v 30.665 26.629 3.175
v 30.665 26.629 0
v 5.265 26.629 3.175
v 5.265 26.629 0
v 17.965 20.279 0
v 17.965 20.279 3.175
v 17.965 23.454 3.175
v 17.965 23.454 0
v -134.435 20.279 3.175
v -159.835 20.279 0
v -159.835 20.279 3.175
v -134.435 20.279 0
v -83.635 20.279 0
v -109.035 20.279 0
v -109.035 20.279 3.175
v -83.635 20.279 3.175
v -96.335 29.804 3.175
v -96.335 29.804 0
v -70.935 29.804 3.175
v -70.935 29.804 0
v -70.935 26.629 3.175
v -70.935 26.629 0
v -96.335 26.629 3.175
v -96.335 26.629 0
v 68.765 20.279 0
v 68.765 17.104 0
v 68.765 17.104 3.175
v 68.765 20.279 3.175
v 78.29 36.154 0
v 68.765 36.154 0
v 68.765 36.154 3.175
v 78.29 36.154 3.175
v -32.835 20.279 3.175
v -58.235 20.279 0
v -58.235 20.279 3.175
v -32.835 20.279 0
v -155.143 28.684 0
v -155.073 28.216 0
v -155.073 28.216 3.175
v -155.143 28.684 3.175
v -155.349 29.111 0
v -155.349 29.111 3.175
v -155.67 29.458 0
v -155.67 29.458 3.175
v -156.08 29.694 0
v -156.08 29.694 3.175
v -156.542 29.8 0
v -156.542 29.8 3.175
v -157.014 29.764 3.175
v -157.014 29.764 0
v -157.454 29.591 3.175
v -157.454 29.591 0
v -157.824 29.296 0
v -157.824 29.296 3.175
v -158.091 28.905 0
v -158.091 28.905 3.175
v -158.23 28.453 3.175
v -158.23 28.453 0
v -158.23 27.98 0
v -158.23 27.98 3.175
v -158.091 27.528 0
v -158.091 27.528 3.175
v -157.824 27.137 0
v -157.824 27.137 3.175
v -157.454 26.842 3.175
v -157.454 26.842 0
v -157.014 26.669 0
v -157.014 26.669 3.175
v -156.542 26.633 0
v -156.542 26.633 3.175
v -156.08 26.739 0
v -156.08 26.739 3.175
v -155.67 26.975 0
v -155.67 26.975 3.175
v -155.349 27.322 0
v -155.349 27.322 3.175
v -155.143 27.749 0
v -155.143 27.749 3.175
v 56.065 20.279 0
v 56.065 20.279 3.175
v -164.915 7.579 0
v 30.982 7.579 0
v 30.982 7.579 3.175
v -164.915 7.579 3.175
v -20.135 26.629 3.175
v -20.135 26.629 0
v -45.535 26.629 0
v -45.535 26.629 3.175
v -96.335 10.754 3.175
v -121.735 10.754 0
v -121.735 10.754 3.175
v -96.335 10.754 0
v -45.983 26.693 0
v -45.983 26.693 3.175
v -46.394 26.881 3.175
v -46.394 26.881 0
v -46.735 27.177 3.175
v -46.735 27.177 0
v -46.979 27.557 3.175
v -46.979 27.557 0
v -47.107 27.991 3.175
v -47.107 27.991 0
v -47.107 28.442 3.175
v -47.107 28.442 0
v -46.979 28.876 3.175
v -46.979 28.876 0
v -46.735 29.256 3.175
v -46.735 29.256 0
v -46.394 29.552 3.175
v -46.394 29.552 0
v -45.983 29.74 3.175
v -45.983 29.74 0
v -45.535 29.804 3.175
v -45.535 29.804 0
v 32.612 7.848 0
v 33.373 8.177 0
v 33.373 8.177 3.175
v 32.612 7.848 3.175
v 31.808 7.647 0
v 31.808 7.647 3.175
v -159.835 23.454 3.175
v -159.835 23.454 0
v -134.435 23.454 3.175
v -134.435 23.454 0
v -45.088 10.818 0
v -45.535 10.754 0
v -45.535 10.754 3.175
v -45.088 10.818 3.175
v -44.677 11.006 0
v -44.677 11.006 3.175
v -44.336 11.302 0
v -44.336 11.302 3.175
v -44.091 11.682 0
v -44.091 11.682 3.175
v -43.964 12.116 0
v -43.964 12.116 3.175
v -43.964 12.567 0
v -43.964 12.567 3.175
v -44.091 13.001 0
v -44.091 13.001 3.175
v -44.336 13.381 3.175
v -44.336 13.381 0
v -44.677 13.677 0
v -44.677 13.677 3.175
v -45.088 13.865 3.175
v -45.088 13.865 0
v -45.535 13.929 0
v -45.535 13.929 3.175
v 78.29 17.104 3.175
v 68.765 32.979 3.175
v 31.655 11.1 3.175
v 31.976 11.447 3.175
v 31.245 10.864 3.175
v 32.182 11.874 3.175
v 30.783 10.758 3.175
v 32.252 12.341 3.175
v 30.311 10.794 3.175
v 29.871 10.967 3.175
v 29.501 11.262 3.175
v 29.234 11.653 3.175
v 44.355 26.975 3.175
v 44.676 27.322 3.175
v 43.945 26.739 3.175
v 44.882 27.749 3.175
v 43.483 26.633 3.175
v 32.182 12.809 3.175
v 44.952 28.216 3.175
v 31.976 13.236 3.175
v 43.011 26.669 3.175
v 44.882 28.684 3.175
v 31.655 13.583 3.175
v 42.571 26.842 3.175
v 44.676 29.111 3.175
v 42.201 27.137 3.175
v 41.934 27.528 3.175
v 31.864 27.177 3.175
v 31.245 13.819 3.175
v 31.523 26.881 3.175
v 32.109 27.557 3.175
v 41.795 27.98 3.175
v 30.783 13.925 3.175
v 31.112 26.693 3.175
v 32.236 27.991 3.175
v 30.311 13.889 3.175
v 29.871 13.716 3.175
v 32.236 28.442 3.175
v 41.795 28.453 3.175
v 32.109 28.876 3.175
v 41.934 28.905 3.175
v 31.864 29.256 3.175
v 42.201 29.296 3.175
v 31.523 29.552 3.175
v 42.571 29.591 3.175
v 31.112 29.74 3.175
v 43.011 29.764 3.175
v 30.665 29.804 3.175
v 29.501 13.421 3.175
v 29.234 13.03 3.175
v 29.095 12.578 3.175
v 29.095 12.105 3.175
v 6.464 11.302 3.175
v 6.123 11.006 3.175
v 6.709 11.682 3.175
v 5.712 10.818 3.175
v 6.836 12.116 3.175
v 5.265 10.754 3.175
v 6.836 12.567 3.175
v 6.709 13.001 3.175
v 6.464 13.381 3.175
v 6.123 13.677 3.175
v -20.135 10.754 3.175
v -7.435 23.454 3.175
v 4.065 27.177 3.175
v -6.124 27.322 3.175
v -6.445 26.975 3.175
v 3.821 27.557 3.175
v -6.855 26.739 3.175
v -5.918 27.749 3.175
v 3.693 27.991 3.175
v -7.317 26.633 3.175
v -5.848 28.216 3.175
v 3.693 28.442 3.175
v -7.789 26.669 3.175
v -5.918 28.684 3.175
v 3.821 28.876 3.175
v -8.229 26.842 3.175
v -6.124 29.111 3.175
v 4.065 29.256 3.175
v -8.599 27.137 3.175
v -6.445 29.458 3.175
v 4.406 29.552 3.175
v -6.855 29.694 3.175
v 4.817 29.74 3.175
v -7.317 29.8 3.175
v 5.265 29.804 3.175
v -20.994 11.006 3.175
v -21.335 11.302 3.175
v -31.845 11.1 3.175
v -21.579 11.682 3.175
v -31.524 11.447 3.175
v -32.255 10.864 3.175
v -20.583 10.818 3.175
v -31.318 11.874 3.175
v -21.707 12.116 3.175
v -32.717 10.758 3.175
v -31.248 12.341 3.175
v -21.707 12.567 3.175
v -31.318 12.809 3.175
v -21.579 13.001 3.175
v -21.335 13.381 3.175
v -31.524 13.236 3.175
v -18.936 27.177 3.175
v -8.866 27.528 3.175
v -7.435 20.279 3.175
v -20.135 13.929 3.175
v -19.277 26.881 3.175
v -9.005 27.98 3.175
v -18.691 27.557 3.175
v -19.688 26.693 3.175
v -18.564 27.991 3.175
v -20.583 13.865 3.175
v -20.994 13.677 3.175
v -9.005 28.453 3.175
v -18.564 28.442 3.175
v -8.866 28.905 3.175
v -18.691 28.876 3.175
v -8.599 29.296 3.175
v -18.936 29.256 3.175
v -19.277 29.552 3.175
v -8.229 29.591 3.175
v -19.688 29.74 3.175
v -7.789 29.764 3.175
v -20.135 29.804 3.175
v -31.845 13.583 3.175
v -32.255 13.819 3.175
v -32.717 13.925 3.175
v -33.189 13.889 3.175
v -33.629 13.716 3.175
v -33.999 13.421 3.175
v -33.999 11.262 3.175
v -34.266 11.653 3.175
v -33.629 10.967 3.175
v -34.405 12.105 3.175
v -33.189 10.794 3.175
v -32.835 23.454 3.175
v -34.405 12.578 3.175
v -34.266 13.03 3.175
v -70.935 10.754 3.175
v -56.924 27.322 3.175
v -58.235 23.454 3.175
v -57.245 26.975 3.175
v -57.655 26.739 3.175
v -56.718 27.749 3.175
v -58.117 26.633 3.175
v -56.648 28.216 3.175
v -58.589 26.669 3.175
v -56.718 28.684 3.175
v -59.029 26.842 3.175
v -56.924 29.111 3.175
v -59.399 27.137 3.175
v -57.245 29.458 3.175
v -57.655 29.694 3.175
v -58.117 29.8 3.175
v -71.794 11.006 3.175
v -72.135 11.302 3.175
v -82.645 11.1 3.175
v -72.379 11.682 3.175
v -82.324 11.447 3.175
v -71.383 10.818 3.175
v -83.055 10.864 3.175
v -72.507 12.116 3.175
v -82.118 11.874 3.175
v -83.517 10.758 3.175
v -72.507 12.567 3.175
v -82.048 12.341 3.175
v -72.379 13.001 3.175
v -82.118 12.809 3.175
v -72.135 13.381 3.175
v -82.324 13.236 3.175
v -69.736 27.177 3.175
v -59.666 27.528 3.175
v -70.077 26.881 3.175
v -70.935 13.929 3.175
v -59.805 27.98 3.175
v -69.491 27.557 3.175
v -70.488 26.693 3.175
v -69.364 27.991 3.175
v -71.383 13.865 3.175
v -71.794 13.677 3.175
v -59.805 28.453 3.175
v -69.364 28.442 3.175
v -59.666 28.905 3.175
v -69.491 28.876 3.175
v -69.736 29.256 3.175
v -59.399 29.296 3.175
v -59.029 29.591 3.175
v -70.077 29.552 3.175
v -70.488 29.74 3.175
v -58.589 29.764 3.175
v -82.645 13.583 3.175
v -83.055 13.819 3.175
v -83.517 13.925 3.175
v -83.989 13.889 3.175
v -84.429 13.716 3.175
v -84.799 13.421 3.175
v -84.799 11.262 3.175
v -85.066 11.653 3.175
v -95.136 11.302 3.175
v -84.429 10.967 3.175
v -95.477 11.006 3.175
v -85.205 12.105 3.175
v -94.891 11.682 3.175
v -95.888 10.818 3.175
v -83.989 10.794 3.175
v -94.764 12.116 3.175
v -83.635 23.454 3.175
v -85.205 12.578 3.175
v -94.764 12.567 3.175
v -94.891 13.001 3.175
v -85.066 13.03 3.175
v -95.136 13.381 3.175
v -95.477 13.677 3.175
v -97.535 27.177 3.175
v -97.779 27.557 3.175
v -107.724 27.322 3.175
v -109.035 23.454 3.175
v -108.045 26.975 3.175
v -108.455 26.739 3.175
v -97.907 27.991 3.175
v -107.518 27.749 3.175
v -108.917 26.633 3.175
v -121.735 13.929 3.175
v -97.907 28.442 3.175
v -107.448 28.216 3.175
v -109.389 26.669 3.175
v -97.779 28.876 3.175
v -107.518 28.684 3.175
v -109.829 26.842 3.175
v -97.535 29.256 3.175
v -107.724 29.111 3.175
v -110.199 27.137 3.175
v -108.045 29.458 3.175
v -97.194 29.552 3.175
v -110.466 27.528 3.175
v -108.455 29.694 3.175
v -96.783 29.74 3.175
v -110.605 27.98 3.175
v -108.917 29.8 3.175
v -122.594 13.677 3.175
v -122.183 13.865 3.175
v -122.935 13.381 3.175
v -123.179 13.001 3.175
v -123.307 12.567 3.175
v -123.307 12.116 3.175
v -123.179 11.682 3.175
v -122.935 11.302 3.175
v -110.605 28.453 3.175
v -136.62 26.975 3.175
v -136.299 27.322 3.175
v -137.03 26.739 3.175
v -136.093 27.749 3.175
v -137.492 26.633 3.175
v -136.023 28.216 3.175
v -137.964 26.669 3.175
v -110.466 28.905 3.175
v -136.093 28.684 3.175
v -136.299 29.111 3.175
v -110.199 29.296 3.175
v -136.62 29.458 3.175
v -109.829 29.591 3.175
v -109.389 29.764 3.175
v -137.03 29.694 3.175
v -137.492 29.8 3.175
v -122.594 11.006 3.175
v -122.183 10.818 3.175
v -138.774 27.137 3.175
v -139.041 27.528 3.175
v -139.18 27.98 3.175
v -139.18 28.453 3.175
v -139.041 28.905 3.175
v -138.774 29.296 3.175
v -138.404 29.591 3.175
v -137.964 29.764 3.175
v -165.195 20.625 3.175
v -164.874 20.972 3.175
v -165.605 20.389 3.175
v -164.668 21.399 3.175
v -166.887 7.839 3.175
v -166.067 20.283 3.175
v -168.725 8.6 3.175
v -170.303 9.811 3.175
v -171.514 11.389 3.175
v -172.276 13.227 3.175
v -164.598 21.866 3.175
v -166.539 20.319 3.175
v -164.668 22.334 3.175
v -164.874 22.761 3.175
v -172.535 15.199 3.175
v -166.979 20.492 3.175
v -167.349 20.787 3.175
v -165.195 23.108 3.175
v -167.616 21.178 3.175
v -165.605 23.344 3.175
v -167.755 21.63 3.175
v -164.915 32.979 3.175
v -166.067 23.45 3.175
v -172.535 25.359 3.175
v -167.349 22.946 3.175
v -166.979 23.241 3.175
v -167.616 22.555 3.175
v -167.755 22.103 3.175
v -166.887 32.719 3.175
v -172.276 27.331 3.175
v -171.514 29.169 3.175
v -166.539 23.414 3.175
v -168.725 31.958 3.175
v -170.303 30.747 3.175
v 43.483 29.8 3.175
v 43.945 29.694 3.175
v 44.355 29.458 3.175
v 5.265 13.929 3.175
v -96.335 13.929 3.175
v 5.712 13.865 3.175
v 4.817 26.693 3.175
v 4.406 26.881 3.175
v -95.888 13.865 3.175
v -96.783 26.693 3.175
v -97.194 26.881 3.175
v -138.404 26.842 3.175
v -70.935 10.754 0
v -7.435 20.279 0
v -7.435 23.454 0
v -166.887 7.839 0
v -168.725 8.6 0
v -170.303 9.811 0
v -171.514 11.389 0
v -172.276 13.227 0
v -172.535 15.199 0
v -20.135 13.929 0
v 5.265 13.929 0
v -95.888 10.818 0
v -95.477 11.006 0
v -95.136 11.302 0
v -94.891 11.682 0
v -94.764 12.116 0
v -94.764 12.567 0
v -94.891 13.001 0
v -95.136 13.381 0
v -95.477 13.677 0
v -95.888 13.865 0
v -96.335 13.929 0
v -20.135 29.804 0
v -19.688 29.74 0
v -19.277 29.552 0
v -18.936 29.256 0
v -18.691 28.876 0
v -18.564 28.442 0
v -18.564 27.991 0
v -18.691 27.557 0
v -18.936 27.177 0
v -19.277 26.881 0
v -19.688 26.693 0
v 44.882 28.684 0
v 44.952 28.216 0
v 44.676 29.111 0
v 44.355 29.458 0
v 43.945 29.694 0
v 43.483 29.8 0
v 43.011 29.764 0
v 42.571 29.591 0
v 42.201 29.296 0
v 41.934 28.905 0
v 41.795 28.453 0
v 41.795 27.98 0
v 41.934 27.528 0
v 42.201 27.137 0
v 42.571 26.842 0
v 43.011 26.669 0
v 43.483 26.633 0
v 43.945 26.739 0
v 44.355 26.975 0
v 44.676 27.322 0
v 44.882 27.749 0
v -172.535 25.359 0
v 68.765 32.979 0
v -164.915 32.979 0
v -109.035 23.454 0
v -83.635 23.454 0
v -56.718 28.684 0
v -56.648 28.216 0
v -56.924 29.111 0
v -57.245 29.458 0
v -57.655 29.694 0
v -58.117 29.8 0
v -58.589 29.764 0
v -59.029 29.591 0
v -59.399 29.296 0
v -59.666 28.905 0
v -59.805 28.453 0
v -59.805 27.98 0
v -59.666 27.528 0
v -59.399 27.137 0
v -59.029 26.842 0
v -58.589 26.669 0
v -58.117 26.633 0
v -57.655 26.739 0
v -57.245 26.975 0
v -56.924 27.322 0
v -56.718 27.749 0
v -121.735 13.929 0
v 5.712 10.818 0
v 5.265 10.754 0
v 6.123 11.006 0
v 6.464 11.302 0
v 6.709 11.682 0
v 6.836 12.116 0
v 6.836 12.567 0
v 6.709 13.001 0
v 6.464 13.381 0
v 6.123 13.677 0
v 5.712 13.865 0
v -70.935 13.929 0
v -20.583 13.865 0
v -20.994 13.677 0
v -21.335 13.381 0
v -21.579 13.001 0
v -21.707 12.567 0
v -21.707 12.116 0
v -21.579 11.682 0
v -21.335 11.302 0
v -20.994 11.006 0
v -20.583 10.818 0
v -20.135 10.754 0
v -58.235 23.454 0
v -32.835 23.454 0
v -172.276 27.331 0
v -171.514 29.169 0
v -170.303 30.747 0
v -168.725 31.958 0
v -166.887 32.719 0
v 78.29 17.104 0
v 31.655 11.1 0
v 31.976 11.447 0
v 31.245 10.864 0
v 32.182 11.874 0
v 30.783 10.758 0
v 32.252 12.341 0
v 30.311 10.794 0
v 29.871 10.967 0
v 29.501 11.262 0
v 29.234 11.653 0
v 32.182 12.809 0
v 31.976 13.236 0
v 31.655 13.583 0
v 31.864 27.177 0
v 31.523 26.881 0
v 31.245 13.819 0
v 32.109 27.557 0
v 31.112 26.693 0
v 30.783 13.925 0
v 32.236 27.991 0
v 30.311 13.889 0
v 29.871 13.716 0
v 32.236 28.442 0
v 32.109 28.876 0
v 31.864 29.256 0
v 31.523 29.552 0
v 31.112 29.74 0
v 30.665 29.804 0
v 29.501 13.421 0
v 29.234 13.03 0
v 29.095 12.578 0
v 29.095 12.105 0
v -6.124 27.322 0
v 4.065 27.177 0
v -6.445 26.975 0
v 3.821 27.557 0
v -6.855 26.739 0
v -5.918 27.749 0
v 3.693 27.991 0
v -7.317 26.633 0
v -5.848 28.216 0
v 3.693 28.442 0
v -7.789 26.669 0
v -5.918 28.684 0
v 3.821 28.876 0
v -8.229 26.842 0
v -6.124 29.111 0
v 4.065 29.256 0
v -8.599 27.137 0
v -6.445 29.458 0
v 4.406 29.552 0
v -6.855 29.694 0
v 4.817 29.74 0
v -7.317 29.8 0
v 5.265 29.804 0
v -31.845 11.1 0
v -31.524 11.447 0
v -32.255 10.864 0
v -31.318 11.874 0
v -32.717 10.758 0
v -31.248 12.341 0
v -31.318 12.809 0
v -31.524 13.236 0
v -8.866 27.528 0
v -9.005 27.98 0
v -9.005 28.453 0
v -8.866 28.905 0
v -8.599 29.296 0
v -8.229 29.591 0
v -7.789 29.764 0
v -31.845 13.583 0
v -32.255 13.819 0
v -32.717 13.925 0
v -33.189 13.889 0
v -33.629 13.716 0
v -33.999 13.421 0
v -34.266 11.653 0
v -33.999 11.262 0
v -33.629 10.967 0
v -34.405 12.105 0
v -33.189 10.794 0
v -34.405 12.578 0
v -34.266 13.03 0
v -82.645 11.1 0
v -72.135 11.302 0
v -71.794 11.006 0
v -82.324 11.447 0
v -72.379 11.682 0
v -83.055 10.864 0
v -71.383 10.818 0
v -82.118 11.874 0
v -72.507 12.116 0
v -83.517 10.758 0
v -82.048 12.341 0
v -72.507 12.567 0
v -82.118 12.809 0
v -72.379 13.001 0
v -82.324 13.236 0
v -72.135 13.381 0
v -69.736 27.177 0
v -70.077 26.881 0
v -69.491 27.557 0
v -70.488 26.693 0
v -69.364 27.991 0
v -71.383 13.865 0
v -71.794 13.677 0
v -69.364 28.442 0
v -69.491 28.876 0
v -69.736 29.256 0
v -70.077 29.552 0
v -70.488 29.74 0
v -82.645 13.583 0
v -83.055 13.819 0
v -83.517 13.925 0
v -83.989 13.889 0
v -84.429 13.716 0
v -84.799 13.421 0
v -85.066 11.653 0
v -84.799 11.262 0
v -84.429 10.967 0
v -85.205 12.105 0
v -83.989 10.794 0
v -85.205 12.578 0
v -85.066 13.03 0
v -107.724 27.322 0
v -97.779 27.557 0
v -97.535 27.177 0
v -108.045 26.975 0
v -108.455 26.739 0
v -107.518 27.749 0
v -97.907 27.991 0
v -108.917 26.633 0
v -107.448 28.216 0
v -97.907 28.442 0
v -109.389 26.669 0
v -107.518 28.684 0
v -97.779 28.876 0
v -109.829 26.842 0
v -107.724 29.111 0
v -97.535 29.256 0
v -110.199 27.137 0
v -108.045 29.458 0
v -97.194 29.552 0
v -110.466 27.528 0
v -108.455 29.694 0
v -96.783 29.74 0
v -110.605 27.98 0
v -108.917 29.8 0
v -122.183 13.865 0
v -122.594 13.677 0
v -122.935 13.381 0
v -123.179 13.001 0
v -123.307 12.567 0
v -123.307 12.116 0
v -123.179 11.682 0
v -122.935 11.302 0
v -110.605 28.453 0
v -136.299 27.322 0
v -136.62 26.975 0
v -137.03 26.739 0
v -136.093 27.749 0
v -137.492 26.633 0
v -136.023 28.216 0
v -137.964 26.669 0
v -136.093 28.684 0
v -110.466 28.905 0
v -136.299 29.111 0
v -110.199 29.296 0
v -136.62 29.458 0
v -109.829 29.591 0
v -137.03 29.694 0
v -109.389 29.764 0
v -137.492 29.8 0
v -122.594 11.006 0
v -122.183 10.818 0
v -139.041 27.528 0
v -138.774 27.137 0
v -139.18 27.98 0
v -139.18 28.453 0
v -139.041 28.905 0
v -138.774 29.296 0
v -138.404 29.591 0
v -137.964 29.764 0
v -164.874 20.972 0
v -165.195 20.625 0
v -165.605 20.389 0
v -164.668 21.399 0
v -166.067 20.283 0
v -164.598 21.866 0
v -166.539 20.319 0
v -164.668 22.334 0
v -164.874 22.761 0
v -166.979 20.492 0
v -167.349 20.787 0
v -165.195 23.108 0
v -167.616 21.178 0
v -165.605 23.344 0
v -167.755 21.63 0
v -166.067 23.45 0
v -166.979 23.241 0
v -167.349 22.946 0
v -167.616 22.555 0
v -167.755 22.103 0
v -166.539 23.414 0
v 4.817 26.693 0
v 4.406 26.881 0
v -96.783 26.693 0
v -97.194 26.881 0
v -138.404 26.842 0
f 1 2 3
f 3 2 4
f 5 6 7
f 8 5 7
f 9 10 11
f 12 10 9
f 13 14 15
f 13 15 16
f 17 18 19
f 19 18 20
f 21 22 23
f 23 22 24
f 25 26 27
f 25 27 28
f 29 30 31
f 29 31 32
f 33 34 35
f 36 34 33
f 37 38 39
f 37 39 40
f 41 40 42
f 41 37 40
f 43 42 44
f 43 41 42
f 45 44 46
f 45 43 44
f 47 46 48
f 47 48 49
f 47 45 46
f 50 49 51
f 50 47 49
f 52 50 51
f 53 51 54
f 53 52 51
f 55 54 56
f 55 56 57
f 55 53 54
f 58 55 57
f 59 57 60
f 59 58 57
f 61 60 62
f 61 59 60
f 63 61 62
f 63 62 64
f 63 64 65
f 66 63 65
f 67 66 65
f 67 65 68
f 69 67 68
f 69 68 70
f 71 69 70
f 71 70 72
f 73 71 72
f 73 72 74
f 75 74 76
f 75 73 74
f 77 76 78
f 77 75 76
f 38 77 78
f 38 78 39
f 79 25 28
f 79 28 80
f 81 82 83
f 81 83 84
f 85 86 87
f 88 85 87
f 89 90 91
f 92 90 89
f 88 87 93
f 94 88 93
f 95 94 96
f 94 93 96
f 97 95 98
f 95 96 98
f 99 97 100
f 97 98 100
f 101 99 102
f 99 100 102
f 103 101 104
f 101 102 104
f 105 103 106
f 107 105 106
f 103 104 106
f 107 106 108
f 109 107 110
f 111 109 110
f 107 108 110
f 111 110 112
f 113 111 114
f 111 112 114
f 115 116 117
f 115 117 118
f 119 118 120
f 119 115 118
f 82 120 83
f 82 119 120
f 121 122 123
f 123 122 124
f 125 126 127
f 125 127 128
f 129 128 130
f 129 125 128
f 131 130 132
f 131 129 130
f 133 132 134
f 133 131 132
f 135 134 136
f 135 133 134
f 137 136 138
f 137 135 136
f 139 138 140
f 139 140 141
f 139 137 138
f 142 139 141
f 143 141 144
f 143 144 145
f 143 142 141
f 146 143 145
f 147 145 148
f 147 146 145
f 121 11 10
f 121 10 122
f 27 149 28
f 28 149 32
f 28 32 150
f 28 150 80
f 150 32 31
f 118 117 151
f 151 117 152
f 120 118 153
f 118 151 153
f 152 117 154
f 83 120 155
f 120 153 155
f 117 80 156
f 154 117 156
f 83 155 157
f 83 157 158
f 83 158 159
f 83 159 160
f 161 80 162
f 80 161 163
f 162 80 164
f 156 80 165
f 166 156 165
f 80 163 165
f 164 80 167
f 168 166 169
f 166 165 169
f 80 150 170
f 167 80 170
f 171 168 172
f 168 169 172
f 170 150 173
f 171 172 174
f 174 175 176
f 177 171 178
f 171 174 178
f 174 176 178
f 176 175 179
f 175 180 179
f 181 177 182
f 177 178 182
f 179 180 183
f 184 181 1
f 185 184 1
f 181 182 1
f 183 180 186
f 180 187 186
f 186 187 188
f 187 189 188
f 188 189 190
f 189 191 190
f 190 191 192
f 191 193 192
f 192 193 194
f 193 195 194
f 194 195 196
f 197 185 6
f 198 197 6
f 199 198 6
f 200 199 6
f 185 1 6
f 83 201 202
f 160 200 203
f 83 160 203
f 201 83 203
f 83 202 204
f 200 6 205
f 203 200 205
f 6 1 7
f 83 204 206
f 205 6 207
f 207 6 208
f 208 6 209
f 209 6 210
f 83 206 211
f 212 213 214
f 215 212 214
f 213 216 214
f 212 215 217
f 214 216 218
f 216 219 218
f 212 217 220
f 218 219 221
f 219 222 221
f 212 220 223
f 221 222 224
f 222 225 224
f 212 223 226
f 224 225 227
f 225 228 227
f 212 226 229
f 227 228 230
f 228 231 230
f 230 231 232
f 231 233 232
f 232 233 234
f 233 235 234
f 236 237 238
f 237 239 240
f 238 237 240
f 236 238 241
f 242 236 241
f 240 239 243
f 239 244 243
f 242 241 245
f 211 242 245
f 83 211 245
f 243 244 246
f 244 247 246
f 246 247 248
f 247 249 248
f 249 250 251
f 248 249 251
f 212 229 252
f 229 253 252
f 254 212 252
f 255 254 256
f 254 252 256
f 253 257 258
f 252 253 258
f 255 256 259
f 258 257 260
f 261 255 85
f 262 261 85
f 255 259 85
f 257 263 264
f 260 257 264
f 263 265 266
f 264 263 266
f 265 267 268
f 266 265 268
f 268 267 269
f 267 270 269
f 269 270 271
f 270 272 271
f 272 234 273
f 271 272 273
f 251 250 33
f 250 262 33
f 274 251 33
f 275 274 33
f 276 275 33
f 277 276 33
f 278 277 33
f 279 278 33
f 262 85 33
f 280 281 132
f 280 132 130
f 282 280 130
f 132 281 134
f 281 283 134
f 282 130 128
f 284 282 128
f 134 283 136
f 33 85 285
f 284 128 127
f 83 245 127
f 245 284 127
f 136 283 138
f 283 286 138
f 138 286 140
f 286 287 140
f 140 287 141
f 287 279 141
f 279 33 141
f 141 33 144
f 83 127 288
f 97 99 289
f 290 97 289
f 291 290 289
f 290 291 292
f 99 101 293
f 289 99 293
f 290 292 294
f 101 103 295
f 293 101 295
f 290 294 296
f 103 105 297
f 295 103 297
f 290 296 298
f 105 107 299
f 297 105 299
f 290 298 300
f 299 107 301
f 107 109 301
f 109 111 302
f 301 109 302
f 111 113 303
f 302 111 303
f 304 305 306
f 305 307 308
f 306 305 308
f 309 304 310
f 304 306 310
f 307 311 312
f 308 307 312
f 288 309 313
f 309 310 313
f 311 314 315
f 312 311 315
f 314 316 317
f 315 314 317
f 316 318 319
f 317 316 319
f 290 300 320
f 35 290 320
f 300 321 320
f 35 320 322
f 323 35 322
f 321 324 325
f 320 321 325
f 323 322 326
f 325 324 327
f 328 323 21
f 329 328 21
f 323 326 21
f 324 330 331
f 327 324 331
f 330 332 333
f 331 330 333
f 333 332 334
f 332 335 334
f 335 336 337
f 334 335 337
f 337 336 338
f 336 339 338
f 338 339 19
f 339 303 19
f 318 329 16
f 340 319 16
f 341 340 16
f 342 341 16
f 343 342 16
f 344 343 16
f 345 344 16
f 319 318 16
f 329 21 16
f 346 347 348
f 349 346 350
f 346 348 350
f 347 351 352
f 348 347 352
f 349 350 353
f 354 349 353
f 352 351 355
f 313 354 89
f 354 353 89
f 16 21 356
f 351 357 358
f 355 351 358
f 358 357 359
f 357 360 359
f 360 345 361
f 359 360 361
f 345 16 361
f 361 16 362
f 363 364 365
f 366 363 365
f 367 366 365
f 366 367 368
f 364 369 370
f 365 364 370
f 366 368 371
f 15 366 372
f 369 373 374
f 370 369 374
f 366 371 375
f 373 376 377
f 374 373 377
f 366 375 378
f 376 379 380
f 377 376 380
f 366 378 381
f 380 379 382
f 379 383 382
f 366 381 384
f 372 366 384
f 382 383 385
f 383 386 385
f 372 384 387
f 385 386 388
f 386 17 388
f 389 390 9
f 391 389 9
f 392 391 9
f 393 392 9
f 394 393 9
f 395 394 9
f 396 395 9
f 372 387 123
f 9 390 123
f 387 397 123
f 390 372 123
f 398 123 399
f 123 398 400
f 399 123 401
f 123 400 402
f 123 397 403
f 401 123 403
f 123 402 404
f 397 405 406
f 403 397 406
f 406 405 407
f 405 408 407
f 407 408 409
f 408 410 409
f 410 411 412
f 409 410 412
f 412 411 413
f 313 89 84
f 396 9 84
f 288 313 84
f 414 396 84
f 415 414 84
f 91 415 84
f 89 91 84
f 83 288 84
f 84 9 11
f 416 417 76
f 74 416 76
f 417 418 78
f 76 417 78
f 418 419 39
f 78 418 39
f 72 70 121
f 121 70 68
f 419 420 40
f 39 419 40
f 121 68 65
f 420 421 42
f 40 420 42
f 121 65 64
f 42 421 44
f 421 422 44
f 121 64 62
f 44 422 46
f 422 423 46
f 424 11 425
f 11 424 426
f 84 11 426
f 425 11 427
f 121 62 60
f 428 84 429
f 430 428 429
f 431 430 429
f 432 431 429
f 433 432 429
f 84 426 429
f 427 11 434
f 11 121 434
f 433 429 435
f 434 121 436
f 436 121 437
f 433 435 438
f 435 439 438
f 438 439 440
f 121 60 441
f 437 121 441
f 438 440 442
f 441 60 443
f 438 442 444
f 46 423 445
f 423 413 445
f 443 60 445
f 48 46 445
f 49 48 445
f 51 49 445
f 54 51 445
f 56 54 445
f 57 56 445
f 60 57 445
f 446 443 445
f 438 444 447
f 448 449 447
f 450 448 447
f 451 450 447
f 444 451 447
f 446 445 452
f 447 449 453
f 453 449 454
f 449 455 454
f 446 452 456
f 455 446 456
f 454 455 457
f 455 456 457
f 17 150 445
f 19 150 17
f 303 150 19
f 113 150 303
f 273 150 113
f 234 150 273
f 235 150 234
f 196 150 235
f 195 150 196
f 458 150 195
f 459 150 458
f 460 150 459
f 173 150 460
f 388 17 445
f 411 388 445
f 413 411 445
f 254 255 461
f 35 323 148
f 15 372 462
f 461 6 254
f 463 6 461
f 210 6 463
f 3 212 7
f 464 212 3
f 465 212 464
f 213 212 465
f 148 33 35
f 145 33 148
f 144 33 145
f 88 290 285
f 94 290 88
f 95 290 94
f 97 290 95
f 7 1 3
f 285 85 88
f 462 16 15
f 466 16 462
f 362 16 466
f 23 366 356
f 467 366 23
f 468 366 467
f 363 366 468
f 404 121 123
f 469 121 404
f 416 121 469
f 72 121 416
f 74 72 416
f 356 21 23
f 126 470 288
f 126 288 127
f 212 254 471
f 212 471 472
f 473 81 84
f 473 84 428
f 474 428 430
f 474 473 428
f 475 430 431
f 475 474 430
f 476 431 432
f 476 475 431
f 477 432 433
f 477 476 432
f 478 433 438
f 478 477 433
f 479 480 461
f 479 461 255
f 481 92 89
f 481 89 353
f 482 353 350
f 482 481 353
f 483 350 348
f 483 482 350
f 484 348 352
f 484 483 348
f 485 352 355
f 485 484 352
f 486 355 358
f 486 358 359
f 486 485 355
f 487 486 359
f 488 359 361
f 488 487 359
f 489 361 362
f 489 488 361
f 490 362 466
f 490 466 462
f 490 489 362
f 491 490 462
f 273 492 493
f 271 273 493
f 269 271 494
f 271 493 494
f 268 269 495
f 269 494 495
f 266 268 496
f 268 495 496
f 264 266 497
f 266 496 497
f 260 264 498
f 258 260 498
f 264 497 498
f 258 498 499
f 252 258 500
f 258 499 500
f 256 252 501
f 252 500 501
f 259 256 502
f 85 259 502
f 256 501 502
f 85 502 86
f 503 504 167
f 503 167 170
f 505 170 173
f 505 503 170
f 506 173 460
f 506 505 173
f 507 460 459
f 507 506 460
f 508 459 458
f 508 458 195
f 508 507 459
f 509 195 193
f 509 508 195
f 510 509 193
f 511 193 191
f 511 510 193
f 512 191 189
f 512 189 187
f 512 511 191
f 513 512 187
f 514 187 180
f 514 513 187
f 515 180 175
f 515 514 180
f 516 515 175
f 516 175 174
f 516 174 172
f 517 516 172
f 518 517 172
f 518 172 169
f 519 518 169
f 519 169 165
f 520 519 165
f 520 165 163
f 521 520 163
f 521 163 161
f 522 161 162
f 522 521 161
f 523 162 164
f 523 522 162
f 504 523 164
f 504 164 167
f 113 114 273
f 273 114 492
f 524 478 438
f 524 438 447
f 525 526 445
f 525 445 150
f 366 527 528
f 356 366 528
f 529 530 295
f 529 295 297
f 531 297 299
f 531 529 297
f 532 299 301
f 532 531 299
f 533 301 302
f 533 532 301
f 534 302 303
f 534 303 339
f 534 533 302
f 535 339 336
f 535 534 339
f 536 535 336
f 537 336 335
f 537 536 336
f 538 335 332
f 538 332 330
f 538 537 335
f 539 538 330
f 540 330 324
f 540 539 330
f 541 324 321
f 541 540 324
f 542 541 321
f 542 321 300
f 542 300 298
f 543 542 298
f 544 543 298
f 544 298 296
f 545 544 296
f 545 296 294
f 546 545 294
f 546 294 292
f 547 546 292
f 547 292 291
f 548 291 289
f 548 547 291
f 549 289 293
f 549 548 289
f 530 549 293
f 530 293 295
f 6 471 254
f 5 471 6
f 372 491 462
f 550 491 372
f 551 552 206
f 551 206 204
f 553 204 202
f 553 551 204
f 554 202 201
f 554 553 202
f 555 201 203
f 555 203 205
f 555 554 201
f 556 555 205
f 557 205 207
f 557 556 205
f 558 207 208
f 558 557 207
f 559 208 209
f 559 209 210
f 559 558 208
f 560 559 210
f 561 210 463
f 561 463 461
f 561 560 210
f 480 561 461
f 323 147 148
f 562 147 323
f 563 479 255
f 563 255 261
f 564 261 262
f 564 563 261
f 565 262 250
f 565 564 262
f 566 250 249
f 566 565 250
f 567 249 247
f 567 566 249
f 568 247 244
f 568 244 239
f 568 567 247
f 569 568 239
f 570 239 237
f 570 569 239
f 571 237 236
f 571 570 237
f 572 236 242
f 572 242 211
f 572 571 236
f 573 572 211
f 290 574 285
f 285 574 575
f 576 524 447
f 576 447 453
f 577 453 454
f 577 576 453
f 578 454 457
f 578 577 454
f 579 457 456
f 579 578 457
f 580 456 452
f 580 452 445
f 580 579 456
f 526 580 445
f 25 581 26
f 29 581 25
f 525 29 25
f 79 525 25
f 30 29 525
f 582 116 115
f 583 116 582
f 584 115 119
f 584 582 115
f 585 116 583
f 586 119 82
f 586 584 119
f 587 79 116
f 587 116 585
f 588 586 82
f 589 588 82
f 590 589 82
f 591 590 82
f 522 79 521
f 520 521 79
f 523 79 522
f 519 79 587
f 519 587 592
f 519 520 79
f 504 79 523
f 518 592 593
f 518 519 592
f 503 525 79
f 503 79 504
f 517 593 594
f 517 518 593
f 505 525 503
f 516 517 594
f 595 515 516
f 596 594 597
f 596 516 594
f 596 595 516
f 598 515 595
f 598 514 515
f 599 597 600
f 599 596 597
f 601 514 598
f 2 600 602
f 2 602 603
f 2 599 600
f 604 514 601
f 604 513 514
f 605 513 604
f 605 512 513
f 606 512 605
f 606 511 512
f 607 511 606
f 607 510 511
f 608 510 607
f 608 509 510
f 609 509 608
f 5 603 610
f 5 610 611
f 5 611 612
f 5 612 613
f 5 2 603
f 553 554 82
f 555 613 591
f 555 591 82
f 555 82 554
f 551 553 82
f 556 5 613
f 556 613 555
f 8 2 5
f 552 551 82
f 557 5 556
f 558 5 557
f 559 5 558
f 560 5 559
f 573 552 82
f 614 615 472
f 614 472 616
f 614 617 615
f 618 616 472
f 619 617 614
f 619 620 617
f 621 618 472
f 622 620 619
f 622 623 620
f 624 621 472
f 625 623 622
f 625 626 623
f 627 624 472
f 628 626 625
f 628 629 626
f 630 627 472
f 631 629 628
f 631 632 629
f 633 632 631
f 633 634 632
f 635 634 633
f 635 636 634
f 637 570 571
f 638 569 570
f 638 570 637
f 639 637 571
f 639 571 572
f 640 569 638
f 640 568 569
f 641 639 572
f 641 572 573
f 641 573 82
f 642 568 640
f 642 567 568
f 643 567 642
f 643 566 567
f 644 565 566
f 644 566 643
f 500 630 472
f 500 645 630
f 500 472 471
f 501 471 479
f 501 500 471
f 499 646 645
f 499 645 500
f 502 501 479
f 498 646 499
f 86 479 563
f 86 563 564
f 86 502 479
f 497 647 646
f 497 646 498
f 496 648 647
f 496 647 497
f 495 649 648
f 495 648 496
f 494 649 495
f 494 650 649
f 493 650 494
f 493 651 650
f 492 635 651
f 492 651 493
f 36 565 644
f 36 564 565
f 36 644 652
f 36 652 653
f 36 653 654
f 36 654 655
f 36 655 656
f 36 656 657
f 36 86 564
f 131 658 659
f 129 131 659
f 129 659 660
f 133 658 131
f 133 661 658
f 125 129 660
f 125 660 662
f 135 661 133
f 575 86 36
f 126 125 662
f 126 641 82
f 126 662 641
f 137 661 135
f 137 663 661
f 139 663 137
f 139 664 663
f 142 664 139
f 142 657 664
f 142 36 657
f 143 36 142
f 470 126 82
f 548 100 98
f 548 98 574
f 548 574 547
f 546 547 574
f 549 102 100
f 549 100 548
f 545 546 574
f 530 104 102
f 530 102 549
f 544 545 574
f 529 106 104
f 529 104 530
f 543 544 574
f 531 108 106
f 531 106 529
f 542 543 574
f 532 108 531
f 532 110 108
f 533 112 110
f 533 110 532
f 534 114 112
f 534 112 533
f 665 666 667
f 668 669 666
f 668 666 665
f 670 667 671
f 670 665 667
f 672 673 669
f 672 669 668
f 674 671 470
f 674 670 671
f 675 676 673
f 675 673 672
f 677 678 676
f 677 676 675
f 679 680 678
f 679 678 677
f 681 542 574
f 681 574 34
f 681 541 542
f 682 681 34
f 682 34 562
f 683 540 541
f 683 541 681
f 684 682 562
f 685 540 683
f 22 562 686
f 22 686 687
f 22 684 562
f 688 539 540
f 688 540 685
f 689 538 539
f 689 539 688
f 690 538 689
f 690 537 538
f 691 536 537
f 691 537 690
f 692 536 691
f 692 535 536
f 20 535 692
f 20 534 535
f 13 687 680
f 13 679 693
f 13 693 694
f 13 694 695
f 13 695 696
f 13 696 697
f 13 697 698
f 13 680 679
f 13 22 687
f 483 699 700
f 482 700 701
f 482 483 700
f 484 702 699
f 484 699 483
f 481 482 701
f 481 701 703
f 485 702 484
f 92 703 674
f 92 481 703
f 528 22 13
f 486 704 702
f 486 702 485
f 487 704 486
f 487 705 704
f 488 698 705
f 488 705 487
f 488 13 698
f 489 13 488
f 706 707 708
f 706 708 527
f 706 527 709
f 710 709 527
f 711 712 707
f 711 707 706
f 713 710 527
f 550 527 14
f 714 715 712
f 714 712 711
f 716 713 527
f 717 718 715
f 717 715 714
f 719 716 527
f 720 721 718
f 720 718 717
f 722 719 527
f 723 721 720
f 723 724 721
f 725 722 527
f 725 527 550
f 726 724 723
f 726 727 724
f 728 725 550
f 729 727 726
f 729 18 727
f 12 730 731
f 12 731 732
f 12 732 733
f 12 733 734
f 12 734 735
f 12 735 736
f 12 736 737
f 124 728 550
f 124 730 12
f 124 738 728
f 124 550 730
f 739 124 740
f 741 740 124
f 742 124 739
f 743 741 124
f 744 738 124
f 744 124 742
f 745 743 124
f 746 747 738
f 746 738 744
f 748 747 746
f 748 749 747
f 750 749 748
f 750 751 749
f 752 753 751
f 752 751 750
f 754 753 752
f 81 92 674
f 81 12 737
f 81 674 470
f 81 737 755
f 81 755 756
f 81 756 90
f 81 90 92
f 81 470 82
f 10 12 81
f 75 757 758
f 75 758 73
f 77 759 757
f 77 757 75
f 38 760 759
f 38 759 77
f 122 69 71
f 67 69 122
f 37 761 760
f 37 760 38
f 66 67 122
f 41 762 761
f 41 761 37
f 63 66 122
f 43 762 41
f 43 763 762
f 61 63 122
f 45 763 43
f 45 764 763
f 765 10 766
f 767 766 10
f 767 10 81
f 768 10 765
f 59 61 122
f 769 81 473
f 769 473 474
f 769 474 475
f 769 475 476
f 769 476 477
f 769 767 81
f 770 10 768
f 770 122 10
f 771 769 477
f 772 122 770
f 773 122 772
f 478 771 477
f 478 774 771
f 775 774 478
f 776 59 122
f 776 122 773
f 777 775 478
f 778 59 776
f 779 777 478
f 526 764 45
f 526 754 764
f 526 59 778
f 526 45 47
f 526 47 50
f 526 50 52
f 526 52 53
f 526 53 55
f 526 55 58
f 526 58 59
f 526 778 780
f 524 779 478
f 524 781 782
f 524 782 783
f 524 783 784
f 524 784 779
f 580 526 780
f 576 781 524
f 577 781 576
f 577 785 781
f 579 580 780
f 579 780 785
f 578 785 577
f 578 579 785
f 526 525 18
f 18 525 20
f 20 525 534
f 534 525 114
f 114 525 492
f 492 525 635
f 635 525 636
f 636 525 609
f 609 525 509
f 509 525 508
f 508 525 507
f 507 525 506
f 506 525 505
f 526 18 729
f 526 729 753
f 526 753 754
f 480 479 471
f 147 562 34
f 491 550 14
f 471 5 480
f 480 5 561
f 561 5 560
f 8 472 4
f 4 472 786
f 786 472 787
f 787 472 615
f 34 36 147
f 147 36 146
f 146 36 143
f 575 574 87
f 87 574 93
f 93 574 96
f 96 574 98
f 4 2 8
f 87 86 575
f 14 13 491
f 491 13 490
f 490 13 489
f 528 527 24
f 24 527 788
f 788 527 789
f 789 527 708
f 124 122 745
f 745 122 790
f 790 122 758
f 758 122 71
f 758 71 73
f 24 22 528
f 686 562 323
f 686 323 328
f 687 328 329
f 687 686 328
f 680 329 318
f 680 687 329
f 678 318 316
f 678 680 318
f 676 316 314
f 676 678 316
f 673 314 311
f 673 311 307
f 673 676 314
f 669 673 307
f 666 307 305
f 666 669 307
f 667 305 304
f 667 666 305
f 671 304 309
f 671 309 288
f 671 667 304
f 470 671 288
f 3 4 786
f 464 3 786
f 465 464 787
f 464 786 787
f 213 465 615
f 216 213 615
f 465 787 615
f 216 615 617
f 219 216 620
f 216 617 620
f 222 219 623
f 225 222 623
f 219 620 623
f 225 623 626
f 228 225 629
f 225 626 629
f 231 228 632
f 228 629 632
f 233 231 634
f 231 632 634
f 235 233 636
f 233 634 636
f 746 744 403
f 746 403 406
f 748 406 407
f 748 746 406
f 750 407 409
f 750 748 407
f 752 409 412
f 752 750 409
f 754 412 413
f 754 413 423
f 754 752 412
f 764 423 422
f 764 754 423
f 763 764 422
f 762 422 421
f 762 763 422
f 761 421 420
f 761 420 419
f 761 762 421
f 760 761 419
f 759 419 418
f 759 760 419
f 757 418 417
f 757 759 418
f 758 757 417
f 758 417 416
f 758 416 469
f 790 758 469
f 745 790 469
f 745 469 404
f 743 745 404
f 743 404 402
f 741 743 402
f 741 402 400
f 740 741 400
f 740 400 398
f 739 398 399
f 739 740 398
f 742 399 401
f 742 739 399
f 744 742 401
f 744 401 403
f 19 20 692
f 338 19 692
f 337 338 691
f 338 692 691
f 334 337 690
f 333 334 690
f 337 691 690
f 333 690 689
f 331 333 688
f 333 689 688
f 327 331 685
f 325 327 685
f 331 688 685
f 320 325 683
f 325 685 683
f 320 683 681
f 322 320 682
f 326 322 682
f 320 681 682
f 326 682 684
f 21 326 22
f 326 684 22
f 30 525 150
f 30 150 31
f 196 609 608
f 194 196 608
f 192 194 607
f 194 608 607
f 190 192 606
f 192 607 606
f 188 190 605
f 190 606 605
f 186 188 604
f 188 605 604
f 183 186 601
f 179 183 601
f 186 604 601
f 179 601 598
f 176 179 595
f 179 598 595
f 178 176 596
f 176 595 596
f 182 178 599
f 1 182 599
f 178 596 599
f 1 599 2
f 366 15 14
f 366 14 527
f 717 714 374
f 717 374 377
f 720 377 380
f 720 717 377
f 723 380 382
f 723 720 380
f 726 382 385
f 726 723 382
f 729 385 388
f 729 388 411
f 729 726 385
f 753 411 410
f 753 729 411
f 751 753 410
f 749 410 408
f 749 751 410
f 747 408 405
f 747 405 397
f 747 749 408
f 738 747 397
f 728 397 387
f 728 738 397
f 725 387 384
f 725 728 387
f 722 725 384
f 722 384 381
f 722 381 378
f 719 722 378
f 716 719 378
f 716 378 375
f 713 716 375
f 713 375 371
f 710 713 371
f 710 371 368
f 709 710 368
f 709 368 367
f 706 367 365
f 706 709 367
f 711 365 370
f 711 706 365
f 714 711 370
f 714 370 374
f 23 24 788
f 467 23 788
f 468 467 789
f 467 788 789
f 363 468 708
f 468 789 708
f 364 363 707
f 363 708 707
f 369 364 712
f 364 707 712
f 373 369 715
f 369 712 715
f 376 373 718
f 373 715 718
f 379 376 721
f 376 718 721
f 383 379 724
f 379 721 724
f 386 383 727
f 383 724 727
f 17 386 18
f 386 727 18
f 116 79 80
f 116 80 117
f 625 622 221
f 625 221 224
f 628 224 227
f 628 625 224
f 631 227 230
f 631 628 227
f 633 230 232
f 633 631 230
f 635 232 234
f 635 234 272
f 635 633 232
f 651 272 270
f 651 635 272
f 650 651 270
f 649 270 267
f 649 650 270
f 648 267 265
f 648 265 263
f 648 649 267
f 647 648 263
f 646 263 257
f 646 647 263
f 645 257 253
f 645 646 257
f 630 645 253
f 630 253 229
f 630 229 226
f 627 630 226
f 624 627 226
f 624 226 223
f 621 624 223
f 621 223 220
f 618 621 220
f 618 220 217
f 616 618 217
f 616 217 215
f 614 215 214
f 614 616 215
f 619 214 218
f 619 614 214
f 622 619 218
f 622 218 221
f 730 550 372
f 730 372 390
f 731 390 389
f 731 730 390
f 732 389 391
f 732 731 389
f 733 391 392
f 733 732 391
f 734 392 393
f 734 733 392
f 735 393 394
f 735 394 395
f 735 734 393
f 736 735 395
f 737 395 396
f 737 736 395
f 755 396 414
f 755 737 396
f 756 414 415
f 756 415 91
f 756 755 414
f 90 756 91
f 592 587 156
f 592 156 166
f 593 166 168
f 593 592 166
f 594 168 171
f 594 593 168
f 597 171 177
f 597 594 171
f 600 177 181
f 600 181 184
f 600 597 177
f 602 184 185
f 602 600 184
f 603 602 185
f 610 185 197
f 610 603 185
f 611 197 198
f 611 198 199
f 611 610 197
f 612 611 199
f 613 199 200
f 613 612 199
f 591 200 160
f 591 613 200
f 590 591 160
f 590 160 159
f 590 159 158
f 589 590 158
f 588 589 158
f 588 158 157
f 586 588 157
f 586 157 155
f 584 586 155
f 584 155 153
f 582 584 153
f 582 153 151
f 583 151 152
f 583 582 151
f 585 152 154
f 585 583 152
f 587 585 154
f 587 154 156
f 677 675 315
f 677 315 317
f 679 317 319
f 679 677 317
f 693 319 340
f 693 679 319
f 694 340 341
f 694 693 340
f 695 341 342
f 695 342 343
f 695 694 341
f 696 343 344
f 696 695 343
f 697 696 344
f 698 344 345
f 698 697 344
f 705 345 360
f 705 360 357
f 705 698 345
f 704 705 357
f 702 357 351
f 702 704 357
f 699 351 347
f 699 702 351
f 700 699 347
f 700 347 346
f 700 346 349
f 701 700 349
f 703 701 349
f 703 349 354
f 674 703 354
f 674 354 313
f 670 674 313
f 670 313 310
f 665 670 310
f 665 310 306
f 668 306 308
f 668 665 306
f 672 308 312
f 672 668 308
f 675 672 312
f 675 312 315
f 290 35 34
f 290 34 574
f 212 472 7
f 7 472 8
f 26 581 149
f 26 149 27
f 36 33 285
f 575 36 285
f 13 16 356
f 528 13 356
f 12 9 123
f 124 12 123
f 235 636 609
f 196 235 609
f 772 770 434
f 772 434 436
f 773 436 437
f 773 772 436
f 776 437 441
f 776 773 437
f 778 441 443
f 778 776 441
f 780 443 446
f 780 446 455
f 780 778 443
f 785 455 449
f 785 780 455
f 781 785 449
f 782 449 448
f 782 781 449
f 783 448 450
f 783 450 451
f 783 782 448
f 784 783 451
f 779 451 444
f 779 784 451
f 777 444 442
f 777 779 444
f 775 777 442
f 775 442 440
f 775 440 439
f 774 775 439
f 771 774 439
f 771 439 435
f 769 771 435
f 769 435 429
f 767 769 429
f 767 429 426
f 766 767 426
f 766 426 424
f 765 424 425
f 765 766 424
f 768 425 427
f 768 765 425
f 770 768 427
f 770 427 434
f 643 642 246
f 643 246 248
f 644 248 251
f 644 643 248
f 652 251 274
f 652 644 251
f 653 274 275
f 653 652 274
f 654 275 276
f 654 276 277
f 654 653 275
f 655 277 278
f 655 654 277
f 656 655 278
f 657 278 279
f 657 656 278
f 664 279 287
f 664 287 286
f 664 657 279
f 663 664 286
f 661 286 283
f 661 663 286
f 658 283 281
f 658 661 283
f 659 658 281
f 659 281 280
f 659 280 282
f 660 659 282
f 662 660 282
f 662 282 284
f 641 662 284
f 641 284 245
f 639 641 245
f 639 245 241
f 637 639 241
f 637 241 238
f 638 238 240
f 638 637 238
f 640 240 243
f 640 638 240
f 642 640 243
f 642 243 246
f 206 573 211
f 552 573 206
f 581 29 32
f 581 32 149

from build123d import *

# Parameters (mm, degrees)
SKETCH1_R           = 1.5875
SKETCH1_W           = 25.4
SKETCH1_H           = 3.175
BOSS_EXTRUDE1_DEPTH = 3.175


with BuildPart() as part:
    # Sketch1 → Boss-Extrude1 (new body)
    with BuildSketch(Plane.XY):
        with BuildLine():
            Line((68.764710276, 20.278973895), (56.064710276, 20.278973895))
            Line((56.064710276, 20.278973895), (33.372798511, 8.176620954))
            ThreePointArc((33.372798511, 8.176620954), (32.214291251, 7.730649994), (30.982210276, 7.578973895))
            Line((30.982210276, 7.578973895), (-152.215289724, 7.578973895))
            Line((-152.215289724, 7.578973895), (-164.915289724, 7.578973895))
            ThreePointArc((-164.915289724, 7.578973895), (-170.303443397, 9.810820222), (-172.535289724, 15.198973895))
            Line((-172.535289724, 15.198973895), (-172.535289724, 23.453973895))
            Line((-172.535289724, 23.453973895), (-172.535289724, 25.358973895))
            ThreePointArc((-172.535289724, 25.358973895), (-170.303443397, 30.747127568), (-164.915289724, 32.978973895))
            Line((-164.915289724, 32.978973895), (-152.215289724, 32.978973895))
            Line((-152.215289724, 32.978973895), (68.764710276, 32.978973895))
            Line((68.764710276, 32.978973895), (68.764710276, 36.153973895))
            Line((68.764710276, 36.153973895), (78.289710276, 36.153973895))
            Line((78.289710276, 36.153973895), (78.289710276, 17.103973895))
            Line((78.289710276, 17.103973895), (68.764710276, 17.103973895))
            Line((68.764710276, 17.103973895), (68.764710276, 20.278973895))
        make_face()
        with Locations((30.664710276, 12.341473895)):
            Circle(SKETCH1_R, mode=Mode.SUBTRACT)
        with Locations((-109.035289724, 28.216473895)):
            Circle(SKETCH1_R, mode=Mode.SUBTRACT)
        with Locations((-166.185289724, 21.866473895)):
            Circle(SKETCH1_R, mode=Mode.SUBTRACT)
        with Locations((-156.660289724, 28.216473895)):
            Circle(SKETCH1_R, mode=Mode.SUBTRACT)
        with Locations((-137.610289724, 28.216473895)):
            Circle(SKETCH1_R, mode=Mode.SUBTRACT)
        with Locations((-83.635289724, 12.341473895)):
            Circle(SKETCH1_R, mode=Mode.SUBTRACT)
        with Locations((-32.835289724, 12.341473895)):
            Circle(SKETCH1_R, mode=Mode.SUBTRACT)
        with Locations((-58.235289724, 28.216473895)):
            Circle(SKETCH1_R, mode=Mode.SUBTRACT)
        with Locations((-7.435289724, 28.216473895)):
            Circle(SKETCH1_R, mode=Mode.SUBTRACT)
        with Locations((43.364710276, 28.216473895)):
            Circle(SKETCH1_R, mode=Mode.SUBTRACT)
        with Locations((-147.135289724, 21.866473895)):
            Rectangle(SKETCH1_W, SKETCH1_H, mode=Mode.SUBTRACT)
        with Locations((-96.335289724, 21.866473895)):
            Rectangle(SKETCH1_W, SKETCH1_H, mode=Mode.SUBTRACT)
        with Locations((-45.535289724, 21.866473895)):
            Rectangle(SKETCH1_W, SKETCH1_H, mode=Mode.SUBTRACT)
        with Locations((5.264710276, 21.866473895)):
            Rectangle(SKETCH1_W, SKETCH1_H, mode=Mode.SUBTRACT)
        with BuildLine():
            Line((5.264710276, 29.803973895), (30.664710276, 29.803973895))
            ThreePointArc((30.664710276, 29.803973895), (32.252210276, 28.216473895), (30.664710276, 26.628973895))
            Line((30.664710276, 26.628973895), (5.264710276, 26.628973895))
            ThreePointArc((5.264710276, 26.628973895), (3.677210276, 28.216473895), (5.264710276, 29.803973895))
        make_face(mode=Mode.SUBTRACT)
        with BuildLine():
            Line((-45.535289724, 13.928973895), (-70.935289724, 13.928973895))
            ThreePointArc((-70.935289724, 13.928973895), (-72.522789724, 12.341473895), (-70.935289724, 10.753973895))
            Line((-70.935289724, 10.753973895), (-45.535289724, 10.753973895))
            ThreePointArc((-45.535289724, 10.753973895), (-43.947789724, 12.341473895), (-45.535289724, 13.928973895))
        make_face(mode=Mode.SUBTRACT)
        with BuildLine():
            Line((-96.335289724, 13.928973895), (-121.735289724, 13.928973895))
            ThreePointArc((-121.735289724, 13.928973895), (-123.322789724, 12.341473895), (-121.735289724, 10.753973895))
            Line((-121.735289724, 10.753973895), (-96.335289724, 10.753973895))
            ThreePointArc((-96.335289724, 10.753973895), (-94.747789724, 12.341473895), (-96.335289724, 13.928973895))
        make_face(mode=Mode.SUBTRACT)
        with BuildLine():
            Line((5.264710276, 13.928973895), (-20.135289724, 13.928973895))
            ThreePointArc((-20.135289724, 13.928973895), (-21.722789724, 12.341473895), (-20.135289724, 10.753973895))
            Line((-20.135289724, 10.753973895), (5.264710276, 10.753973895))
            ThreePointArc((5.264710276, 10.753973895), (6.852210276, 12.341473895), (5.264710276, 13.928973895))
        make_face(mode=Mode.SUBTRACT)
        with BuildLine():
            Line((-45.535289724, 29.803973895), (-20.135289724, 29.803973895))
            ThreePointArc((-20.135289724, 29.803973895), (-18.547789724, 28.216473895), (-20.135289724, 26.628973895))
            Line((-20.135289724, 26.628973895), (-45.535289724, 26.628973895))
            ThreePointArc((-45.535289724, 26.628973895), (-47.122789724, 28.216473895), (-45.535289724, 29.803973895))
        make_face(mode=Mode.SUBTRACT)
        with BuildLine():
            Line((-96.335289724, 29.803973895), (-70.935289724, 29.803973895))
            ThreePointArc((-70.935289724, 29.803973895), (-69.347789724, 28.216473895), (-70.935289724, 26.628973895))
            Line((-70.935289724, 26.628973895), (-96.335289724, 26.628973895))
            ThreePointArc((-96.335289724, 26.628973895), (-97.922789724, 28.216473895), (-96.335289724, 29.803973895))
        make_face(mode=Mode.SUBTRACT)
    extrude(amount=BOSS_EXTRUDE1_DEPTH)


solid = part.part
